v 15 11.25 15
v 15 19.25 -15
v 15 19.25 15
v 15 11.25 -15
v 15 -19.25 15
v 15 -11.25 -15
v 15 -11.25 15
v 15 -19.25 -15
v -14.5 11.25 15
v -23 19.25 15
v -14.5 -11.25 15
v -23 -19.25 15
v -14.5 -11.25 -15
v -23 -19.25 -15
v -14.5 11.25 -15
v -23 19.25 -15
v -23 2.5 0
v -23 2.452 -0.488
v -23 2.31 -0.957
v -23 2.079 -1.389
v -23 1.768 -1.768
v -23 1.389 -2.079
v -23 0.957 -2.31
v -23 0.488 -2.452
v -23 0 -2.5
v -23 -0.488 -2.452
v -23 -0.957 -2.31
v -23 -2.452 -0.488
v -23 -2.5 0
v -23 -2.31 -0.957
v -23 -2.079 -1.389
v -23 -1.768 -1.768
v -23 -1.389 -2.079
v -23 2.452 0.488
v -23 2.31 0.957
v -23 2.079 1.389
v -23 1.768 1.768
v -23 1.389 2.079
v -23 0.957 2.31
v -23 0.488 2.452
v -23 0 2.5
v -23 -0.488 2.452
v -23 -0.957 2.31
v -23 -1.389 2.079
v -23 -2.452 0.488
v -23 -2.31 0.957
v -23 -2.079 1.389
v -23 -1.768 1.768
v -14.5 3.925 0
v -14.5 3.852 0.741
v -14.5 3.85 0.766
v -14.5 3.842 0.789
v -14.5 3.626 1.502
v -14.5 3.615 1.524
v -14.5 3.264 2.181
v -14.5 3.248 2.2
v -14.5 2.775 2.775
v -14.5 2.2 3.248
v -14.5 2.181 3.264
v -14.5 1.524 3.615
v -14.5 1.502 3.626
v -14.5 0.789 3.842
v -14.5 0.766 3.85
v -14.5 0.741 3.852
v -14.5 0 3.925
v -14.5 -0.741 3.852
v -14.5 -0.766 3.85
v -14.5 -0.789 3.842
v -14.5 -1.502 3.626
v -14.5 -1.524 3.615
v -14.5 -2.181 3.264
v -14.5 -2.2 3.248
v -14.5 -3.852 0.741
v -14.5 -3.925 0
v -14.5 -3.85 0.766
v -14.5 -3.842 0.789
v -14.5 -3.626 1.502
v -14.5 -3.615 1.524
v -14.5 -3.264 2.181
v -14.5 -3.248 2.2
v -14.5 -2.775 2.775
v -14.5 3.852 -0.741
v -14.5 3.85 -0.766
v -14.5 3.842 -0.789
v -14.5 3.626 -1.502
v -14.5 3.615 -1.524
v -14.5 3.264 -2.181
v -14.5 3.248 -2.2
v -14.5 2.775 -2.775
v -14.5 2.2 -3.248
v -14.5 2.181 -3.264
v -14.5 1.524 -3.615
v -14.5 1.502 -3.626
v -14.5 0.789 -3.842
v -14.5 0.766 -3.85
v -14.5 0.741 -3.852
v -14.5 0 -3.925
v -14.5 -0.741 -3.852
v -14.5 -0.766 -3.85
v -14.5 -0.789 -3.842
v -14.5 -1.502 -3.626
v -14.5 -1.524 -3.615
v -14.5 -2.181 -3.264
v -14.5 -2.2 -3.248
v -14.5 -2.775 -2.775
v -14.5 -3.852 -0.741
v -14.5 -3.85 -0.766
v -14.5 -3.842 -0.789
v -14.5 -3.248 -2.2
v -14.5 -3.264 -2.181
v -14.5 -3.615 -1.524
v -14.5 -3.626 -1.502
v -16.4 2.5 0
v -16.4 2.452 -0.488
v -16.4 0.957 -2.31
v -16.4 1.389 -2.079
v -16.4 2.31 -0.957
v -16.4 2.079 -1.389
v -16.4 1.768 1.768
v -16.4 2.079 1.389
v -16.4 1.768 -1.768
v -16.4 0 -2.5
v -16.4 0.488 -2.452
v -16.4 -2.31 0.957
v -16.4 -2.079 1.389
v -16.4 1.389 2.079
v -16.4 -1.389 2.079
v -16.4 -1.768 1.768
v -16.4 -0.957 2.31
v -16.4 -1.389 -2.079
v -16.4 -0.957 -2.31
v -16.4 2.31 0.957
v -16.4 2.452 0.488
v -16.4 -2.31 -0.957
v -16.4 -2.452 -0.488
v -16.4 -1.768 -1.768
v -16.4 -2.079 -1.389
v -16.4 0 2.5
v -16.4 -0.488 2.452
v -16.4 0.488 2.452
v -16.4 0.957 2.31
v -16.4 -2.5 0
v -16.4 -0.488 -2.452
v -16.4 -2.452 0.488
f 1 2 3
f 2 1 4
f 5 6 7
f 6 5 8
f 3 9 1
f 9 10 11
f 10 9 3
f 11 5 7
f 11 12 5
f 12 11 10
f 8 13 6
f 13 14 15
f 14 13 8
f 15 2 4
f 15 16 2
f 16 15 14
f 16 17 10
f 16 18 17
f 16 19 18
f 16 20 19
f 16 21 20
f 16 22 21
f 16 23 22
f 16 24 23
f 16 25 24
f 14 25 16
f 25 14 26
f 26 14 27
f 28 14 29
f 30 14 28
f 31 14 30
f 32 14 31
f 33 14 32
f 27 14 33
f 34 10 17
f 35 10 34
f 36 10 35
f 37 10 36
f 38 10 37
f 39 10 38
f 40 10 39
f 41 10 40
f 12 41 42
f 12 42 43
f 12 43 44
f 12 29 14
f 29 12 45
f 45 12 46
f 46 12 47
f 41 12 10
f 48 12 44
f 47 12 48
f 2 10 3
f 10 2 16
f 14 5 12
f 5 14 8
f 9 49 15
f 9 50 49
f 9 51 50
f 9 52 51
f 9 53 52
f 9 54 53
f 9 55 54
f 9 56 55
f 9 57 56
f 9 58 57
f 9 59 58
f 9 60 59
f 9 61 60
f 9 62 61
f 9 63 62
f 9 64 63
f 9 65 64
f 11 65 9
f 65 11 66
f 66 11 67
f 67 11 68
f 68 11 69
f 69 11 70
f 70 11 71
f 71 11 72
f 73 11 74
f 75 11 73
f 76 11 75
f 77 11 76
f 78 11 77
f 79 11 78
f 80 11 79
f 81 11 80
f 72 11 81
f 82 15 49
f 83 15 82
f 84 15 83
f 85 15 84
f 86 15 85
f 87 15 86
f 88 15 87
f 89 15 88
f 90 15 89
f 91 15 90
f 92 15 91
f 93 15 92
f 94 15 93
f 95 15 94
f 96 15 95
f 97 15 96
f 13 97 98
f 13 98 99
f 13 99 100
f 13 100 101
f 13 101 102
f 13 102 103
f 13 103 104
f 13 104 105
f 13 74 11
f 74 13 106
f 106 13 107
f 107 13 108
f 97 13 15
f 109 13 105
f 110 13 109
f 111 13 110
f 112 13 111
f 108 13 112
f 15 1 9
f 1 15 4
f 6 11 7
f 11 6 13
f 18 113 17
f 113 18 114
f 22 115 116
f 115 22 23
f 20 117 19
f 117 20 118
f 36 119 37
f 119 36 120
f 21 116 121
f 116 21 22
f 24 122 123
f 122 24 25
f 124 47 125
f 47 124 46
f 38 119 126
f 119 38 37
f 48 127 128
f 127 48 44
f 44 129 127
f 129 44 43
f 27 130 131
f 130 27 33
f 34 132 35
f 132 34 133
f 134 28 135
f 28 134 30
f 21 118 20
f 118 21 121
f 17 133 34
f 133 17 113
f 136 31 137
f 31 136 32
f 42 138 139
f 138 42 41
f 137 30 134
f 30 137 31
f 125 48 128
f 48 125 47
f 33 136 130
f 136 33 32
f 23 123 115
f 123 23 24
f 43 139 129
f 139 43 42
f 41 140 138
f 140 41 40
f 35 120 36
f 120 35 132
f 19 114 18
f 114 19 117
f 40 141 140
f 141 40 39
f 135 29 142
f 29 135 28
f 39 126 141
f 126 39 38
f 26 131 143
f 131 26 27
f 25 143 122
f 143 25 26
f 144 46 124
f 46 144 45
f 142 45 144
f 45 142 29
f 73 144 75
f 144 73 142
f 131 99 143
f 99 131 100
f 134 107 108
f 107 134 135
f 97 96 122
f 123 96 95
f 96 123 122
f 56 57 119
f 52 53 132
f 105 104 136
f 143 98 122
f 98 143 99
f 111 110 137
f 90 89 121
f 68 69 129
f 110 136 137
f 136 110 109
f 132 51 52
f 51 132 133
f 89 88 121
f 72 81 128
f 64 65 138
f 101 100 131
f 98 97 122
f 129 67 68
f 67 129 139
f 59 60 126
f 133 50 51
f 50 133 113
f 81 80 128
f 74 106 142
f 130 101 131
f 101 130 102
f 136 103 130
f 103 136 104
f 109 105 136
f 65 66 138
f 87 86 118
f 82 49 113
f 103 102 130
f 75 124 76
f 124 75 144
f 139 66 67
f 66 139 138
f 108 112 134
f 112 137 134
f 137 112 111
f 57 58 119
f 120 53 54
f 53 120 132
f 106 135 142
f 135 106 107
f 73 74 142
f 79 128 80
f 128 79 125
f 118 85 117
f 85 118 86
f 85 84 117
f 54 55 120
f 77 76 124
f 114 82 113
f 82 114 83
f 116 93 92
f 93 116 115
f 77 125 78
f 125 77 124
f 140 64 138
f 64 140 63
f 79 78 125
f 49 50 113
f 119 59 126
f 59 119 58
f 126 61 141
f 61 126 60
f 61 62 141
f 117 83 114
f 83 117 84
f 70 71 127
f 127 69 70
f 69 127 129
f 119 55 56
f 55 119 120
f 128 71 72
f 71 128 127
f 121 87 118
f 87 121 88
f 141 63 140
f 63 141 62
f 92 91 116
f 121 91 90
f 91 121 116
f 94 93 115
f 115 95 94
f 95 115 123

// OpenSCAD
height=30;
cutout_l=30;
cutout_w=22.5;
wall=8;

difference() {
  translate([-(wall/2),0,0]) cube([cutout_l+wall,cutout_w+2*wall,height], center=true);
  translate([1,0,0]) cube([cutout_l+1,cutout_w,height+1], center=true);
  translate([-(cutout_l/2+wall/2-0.25),0,0]) rotate([0,90,0]) cylinder(d=5,h=wall+2,$fn=32, center=true);
  translate([-((cutout_l+1)/2-0.1),0,0]) rotate([0,90,0]) cylinder(d1=5,d2=8,h=wall/4,center=true,$fn=32);}
